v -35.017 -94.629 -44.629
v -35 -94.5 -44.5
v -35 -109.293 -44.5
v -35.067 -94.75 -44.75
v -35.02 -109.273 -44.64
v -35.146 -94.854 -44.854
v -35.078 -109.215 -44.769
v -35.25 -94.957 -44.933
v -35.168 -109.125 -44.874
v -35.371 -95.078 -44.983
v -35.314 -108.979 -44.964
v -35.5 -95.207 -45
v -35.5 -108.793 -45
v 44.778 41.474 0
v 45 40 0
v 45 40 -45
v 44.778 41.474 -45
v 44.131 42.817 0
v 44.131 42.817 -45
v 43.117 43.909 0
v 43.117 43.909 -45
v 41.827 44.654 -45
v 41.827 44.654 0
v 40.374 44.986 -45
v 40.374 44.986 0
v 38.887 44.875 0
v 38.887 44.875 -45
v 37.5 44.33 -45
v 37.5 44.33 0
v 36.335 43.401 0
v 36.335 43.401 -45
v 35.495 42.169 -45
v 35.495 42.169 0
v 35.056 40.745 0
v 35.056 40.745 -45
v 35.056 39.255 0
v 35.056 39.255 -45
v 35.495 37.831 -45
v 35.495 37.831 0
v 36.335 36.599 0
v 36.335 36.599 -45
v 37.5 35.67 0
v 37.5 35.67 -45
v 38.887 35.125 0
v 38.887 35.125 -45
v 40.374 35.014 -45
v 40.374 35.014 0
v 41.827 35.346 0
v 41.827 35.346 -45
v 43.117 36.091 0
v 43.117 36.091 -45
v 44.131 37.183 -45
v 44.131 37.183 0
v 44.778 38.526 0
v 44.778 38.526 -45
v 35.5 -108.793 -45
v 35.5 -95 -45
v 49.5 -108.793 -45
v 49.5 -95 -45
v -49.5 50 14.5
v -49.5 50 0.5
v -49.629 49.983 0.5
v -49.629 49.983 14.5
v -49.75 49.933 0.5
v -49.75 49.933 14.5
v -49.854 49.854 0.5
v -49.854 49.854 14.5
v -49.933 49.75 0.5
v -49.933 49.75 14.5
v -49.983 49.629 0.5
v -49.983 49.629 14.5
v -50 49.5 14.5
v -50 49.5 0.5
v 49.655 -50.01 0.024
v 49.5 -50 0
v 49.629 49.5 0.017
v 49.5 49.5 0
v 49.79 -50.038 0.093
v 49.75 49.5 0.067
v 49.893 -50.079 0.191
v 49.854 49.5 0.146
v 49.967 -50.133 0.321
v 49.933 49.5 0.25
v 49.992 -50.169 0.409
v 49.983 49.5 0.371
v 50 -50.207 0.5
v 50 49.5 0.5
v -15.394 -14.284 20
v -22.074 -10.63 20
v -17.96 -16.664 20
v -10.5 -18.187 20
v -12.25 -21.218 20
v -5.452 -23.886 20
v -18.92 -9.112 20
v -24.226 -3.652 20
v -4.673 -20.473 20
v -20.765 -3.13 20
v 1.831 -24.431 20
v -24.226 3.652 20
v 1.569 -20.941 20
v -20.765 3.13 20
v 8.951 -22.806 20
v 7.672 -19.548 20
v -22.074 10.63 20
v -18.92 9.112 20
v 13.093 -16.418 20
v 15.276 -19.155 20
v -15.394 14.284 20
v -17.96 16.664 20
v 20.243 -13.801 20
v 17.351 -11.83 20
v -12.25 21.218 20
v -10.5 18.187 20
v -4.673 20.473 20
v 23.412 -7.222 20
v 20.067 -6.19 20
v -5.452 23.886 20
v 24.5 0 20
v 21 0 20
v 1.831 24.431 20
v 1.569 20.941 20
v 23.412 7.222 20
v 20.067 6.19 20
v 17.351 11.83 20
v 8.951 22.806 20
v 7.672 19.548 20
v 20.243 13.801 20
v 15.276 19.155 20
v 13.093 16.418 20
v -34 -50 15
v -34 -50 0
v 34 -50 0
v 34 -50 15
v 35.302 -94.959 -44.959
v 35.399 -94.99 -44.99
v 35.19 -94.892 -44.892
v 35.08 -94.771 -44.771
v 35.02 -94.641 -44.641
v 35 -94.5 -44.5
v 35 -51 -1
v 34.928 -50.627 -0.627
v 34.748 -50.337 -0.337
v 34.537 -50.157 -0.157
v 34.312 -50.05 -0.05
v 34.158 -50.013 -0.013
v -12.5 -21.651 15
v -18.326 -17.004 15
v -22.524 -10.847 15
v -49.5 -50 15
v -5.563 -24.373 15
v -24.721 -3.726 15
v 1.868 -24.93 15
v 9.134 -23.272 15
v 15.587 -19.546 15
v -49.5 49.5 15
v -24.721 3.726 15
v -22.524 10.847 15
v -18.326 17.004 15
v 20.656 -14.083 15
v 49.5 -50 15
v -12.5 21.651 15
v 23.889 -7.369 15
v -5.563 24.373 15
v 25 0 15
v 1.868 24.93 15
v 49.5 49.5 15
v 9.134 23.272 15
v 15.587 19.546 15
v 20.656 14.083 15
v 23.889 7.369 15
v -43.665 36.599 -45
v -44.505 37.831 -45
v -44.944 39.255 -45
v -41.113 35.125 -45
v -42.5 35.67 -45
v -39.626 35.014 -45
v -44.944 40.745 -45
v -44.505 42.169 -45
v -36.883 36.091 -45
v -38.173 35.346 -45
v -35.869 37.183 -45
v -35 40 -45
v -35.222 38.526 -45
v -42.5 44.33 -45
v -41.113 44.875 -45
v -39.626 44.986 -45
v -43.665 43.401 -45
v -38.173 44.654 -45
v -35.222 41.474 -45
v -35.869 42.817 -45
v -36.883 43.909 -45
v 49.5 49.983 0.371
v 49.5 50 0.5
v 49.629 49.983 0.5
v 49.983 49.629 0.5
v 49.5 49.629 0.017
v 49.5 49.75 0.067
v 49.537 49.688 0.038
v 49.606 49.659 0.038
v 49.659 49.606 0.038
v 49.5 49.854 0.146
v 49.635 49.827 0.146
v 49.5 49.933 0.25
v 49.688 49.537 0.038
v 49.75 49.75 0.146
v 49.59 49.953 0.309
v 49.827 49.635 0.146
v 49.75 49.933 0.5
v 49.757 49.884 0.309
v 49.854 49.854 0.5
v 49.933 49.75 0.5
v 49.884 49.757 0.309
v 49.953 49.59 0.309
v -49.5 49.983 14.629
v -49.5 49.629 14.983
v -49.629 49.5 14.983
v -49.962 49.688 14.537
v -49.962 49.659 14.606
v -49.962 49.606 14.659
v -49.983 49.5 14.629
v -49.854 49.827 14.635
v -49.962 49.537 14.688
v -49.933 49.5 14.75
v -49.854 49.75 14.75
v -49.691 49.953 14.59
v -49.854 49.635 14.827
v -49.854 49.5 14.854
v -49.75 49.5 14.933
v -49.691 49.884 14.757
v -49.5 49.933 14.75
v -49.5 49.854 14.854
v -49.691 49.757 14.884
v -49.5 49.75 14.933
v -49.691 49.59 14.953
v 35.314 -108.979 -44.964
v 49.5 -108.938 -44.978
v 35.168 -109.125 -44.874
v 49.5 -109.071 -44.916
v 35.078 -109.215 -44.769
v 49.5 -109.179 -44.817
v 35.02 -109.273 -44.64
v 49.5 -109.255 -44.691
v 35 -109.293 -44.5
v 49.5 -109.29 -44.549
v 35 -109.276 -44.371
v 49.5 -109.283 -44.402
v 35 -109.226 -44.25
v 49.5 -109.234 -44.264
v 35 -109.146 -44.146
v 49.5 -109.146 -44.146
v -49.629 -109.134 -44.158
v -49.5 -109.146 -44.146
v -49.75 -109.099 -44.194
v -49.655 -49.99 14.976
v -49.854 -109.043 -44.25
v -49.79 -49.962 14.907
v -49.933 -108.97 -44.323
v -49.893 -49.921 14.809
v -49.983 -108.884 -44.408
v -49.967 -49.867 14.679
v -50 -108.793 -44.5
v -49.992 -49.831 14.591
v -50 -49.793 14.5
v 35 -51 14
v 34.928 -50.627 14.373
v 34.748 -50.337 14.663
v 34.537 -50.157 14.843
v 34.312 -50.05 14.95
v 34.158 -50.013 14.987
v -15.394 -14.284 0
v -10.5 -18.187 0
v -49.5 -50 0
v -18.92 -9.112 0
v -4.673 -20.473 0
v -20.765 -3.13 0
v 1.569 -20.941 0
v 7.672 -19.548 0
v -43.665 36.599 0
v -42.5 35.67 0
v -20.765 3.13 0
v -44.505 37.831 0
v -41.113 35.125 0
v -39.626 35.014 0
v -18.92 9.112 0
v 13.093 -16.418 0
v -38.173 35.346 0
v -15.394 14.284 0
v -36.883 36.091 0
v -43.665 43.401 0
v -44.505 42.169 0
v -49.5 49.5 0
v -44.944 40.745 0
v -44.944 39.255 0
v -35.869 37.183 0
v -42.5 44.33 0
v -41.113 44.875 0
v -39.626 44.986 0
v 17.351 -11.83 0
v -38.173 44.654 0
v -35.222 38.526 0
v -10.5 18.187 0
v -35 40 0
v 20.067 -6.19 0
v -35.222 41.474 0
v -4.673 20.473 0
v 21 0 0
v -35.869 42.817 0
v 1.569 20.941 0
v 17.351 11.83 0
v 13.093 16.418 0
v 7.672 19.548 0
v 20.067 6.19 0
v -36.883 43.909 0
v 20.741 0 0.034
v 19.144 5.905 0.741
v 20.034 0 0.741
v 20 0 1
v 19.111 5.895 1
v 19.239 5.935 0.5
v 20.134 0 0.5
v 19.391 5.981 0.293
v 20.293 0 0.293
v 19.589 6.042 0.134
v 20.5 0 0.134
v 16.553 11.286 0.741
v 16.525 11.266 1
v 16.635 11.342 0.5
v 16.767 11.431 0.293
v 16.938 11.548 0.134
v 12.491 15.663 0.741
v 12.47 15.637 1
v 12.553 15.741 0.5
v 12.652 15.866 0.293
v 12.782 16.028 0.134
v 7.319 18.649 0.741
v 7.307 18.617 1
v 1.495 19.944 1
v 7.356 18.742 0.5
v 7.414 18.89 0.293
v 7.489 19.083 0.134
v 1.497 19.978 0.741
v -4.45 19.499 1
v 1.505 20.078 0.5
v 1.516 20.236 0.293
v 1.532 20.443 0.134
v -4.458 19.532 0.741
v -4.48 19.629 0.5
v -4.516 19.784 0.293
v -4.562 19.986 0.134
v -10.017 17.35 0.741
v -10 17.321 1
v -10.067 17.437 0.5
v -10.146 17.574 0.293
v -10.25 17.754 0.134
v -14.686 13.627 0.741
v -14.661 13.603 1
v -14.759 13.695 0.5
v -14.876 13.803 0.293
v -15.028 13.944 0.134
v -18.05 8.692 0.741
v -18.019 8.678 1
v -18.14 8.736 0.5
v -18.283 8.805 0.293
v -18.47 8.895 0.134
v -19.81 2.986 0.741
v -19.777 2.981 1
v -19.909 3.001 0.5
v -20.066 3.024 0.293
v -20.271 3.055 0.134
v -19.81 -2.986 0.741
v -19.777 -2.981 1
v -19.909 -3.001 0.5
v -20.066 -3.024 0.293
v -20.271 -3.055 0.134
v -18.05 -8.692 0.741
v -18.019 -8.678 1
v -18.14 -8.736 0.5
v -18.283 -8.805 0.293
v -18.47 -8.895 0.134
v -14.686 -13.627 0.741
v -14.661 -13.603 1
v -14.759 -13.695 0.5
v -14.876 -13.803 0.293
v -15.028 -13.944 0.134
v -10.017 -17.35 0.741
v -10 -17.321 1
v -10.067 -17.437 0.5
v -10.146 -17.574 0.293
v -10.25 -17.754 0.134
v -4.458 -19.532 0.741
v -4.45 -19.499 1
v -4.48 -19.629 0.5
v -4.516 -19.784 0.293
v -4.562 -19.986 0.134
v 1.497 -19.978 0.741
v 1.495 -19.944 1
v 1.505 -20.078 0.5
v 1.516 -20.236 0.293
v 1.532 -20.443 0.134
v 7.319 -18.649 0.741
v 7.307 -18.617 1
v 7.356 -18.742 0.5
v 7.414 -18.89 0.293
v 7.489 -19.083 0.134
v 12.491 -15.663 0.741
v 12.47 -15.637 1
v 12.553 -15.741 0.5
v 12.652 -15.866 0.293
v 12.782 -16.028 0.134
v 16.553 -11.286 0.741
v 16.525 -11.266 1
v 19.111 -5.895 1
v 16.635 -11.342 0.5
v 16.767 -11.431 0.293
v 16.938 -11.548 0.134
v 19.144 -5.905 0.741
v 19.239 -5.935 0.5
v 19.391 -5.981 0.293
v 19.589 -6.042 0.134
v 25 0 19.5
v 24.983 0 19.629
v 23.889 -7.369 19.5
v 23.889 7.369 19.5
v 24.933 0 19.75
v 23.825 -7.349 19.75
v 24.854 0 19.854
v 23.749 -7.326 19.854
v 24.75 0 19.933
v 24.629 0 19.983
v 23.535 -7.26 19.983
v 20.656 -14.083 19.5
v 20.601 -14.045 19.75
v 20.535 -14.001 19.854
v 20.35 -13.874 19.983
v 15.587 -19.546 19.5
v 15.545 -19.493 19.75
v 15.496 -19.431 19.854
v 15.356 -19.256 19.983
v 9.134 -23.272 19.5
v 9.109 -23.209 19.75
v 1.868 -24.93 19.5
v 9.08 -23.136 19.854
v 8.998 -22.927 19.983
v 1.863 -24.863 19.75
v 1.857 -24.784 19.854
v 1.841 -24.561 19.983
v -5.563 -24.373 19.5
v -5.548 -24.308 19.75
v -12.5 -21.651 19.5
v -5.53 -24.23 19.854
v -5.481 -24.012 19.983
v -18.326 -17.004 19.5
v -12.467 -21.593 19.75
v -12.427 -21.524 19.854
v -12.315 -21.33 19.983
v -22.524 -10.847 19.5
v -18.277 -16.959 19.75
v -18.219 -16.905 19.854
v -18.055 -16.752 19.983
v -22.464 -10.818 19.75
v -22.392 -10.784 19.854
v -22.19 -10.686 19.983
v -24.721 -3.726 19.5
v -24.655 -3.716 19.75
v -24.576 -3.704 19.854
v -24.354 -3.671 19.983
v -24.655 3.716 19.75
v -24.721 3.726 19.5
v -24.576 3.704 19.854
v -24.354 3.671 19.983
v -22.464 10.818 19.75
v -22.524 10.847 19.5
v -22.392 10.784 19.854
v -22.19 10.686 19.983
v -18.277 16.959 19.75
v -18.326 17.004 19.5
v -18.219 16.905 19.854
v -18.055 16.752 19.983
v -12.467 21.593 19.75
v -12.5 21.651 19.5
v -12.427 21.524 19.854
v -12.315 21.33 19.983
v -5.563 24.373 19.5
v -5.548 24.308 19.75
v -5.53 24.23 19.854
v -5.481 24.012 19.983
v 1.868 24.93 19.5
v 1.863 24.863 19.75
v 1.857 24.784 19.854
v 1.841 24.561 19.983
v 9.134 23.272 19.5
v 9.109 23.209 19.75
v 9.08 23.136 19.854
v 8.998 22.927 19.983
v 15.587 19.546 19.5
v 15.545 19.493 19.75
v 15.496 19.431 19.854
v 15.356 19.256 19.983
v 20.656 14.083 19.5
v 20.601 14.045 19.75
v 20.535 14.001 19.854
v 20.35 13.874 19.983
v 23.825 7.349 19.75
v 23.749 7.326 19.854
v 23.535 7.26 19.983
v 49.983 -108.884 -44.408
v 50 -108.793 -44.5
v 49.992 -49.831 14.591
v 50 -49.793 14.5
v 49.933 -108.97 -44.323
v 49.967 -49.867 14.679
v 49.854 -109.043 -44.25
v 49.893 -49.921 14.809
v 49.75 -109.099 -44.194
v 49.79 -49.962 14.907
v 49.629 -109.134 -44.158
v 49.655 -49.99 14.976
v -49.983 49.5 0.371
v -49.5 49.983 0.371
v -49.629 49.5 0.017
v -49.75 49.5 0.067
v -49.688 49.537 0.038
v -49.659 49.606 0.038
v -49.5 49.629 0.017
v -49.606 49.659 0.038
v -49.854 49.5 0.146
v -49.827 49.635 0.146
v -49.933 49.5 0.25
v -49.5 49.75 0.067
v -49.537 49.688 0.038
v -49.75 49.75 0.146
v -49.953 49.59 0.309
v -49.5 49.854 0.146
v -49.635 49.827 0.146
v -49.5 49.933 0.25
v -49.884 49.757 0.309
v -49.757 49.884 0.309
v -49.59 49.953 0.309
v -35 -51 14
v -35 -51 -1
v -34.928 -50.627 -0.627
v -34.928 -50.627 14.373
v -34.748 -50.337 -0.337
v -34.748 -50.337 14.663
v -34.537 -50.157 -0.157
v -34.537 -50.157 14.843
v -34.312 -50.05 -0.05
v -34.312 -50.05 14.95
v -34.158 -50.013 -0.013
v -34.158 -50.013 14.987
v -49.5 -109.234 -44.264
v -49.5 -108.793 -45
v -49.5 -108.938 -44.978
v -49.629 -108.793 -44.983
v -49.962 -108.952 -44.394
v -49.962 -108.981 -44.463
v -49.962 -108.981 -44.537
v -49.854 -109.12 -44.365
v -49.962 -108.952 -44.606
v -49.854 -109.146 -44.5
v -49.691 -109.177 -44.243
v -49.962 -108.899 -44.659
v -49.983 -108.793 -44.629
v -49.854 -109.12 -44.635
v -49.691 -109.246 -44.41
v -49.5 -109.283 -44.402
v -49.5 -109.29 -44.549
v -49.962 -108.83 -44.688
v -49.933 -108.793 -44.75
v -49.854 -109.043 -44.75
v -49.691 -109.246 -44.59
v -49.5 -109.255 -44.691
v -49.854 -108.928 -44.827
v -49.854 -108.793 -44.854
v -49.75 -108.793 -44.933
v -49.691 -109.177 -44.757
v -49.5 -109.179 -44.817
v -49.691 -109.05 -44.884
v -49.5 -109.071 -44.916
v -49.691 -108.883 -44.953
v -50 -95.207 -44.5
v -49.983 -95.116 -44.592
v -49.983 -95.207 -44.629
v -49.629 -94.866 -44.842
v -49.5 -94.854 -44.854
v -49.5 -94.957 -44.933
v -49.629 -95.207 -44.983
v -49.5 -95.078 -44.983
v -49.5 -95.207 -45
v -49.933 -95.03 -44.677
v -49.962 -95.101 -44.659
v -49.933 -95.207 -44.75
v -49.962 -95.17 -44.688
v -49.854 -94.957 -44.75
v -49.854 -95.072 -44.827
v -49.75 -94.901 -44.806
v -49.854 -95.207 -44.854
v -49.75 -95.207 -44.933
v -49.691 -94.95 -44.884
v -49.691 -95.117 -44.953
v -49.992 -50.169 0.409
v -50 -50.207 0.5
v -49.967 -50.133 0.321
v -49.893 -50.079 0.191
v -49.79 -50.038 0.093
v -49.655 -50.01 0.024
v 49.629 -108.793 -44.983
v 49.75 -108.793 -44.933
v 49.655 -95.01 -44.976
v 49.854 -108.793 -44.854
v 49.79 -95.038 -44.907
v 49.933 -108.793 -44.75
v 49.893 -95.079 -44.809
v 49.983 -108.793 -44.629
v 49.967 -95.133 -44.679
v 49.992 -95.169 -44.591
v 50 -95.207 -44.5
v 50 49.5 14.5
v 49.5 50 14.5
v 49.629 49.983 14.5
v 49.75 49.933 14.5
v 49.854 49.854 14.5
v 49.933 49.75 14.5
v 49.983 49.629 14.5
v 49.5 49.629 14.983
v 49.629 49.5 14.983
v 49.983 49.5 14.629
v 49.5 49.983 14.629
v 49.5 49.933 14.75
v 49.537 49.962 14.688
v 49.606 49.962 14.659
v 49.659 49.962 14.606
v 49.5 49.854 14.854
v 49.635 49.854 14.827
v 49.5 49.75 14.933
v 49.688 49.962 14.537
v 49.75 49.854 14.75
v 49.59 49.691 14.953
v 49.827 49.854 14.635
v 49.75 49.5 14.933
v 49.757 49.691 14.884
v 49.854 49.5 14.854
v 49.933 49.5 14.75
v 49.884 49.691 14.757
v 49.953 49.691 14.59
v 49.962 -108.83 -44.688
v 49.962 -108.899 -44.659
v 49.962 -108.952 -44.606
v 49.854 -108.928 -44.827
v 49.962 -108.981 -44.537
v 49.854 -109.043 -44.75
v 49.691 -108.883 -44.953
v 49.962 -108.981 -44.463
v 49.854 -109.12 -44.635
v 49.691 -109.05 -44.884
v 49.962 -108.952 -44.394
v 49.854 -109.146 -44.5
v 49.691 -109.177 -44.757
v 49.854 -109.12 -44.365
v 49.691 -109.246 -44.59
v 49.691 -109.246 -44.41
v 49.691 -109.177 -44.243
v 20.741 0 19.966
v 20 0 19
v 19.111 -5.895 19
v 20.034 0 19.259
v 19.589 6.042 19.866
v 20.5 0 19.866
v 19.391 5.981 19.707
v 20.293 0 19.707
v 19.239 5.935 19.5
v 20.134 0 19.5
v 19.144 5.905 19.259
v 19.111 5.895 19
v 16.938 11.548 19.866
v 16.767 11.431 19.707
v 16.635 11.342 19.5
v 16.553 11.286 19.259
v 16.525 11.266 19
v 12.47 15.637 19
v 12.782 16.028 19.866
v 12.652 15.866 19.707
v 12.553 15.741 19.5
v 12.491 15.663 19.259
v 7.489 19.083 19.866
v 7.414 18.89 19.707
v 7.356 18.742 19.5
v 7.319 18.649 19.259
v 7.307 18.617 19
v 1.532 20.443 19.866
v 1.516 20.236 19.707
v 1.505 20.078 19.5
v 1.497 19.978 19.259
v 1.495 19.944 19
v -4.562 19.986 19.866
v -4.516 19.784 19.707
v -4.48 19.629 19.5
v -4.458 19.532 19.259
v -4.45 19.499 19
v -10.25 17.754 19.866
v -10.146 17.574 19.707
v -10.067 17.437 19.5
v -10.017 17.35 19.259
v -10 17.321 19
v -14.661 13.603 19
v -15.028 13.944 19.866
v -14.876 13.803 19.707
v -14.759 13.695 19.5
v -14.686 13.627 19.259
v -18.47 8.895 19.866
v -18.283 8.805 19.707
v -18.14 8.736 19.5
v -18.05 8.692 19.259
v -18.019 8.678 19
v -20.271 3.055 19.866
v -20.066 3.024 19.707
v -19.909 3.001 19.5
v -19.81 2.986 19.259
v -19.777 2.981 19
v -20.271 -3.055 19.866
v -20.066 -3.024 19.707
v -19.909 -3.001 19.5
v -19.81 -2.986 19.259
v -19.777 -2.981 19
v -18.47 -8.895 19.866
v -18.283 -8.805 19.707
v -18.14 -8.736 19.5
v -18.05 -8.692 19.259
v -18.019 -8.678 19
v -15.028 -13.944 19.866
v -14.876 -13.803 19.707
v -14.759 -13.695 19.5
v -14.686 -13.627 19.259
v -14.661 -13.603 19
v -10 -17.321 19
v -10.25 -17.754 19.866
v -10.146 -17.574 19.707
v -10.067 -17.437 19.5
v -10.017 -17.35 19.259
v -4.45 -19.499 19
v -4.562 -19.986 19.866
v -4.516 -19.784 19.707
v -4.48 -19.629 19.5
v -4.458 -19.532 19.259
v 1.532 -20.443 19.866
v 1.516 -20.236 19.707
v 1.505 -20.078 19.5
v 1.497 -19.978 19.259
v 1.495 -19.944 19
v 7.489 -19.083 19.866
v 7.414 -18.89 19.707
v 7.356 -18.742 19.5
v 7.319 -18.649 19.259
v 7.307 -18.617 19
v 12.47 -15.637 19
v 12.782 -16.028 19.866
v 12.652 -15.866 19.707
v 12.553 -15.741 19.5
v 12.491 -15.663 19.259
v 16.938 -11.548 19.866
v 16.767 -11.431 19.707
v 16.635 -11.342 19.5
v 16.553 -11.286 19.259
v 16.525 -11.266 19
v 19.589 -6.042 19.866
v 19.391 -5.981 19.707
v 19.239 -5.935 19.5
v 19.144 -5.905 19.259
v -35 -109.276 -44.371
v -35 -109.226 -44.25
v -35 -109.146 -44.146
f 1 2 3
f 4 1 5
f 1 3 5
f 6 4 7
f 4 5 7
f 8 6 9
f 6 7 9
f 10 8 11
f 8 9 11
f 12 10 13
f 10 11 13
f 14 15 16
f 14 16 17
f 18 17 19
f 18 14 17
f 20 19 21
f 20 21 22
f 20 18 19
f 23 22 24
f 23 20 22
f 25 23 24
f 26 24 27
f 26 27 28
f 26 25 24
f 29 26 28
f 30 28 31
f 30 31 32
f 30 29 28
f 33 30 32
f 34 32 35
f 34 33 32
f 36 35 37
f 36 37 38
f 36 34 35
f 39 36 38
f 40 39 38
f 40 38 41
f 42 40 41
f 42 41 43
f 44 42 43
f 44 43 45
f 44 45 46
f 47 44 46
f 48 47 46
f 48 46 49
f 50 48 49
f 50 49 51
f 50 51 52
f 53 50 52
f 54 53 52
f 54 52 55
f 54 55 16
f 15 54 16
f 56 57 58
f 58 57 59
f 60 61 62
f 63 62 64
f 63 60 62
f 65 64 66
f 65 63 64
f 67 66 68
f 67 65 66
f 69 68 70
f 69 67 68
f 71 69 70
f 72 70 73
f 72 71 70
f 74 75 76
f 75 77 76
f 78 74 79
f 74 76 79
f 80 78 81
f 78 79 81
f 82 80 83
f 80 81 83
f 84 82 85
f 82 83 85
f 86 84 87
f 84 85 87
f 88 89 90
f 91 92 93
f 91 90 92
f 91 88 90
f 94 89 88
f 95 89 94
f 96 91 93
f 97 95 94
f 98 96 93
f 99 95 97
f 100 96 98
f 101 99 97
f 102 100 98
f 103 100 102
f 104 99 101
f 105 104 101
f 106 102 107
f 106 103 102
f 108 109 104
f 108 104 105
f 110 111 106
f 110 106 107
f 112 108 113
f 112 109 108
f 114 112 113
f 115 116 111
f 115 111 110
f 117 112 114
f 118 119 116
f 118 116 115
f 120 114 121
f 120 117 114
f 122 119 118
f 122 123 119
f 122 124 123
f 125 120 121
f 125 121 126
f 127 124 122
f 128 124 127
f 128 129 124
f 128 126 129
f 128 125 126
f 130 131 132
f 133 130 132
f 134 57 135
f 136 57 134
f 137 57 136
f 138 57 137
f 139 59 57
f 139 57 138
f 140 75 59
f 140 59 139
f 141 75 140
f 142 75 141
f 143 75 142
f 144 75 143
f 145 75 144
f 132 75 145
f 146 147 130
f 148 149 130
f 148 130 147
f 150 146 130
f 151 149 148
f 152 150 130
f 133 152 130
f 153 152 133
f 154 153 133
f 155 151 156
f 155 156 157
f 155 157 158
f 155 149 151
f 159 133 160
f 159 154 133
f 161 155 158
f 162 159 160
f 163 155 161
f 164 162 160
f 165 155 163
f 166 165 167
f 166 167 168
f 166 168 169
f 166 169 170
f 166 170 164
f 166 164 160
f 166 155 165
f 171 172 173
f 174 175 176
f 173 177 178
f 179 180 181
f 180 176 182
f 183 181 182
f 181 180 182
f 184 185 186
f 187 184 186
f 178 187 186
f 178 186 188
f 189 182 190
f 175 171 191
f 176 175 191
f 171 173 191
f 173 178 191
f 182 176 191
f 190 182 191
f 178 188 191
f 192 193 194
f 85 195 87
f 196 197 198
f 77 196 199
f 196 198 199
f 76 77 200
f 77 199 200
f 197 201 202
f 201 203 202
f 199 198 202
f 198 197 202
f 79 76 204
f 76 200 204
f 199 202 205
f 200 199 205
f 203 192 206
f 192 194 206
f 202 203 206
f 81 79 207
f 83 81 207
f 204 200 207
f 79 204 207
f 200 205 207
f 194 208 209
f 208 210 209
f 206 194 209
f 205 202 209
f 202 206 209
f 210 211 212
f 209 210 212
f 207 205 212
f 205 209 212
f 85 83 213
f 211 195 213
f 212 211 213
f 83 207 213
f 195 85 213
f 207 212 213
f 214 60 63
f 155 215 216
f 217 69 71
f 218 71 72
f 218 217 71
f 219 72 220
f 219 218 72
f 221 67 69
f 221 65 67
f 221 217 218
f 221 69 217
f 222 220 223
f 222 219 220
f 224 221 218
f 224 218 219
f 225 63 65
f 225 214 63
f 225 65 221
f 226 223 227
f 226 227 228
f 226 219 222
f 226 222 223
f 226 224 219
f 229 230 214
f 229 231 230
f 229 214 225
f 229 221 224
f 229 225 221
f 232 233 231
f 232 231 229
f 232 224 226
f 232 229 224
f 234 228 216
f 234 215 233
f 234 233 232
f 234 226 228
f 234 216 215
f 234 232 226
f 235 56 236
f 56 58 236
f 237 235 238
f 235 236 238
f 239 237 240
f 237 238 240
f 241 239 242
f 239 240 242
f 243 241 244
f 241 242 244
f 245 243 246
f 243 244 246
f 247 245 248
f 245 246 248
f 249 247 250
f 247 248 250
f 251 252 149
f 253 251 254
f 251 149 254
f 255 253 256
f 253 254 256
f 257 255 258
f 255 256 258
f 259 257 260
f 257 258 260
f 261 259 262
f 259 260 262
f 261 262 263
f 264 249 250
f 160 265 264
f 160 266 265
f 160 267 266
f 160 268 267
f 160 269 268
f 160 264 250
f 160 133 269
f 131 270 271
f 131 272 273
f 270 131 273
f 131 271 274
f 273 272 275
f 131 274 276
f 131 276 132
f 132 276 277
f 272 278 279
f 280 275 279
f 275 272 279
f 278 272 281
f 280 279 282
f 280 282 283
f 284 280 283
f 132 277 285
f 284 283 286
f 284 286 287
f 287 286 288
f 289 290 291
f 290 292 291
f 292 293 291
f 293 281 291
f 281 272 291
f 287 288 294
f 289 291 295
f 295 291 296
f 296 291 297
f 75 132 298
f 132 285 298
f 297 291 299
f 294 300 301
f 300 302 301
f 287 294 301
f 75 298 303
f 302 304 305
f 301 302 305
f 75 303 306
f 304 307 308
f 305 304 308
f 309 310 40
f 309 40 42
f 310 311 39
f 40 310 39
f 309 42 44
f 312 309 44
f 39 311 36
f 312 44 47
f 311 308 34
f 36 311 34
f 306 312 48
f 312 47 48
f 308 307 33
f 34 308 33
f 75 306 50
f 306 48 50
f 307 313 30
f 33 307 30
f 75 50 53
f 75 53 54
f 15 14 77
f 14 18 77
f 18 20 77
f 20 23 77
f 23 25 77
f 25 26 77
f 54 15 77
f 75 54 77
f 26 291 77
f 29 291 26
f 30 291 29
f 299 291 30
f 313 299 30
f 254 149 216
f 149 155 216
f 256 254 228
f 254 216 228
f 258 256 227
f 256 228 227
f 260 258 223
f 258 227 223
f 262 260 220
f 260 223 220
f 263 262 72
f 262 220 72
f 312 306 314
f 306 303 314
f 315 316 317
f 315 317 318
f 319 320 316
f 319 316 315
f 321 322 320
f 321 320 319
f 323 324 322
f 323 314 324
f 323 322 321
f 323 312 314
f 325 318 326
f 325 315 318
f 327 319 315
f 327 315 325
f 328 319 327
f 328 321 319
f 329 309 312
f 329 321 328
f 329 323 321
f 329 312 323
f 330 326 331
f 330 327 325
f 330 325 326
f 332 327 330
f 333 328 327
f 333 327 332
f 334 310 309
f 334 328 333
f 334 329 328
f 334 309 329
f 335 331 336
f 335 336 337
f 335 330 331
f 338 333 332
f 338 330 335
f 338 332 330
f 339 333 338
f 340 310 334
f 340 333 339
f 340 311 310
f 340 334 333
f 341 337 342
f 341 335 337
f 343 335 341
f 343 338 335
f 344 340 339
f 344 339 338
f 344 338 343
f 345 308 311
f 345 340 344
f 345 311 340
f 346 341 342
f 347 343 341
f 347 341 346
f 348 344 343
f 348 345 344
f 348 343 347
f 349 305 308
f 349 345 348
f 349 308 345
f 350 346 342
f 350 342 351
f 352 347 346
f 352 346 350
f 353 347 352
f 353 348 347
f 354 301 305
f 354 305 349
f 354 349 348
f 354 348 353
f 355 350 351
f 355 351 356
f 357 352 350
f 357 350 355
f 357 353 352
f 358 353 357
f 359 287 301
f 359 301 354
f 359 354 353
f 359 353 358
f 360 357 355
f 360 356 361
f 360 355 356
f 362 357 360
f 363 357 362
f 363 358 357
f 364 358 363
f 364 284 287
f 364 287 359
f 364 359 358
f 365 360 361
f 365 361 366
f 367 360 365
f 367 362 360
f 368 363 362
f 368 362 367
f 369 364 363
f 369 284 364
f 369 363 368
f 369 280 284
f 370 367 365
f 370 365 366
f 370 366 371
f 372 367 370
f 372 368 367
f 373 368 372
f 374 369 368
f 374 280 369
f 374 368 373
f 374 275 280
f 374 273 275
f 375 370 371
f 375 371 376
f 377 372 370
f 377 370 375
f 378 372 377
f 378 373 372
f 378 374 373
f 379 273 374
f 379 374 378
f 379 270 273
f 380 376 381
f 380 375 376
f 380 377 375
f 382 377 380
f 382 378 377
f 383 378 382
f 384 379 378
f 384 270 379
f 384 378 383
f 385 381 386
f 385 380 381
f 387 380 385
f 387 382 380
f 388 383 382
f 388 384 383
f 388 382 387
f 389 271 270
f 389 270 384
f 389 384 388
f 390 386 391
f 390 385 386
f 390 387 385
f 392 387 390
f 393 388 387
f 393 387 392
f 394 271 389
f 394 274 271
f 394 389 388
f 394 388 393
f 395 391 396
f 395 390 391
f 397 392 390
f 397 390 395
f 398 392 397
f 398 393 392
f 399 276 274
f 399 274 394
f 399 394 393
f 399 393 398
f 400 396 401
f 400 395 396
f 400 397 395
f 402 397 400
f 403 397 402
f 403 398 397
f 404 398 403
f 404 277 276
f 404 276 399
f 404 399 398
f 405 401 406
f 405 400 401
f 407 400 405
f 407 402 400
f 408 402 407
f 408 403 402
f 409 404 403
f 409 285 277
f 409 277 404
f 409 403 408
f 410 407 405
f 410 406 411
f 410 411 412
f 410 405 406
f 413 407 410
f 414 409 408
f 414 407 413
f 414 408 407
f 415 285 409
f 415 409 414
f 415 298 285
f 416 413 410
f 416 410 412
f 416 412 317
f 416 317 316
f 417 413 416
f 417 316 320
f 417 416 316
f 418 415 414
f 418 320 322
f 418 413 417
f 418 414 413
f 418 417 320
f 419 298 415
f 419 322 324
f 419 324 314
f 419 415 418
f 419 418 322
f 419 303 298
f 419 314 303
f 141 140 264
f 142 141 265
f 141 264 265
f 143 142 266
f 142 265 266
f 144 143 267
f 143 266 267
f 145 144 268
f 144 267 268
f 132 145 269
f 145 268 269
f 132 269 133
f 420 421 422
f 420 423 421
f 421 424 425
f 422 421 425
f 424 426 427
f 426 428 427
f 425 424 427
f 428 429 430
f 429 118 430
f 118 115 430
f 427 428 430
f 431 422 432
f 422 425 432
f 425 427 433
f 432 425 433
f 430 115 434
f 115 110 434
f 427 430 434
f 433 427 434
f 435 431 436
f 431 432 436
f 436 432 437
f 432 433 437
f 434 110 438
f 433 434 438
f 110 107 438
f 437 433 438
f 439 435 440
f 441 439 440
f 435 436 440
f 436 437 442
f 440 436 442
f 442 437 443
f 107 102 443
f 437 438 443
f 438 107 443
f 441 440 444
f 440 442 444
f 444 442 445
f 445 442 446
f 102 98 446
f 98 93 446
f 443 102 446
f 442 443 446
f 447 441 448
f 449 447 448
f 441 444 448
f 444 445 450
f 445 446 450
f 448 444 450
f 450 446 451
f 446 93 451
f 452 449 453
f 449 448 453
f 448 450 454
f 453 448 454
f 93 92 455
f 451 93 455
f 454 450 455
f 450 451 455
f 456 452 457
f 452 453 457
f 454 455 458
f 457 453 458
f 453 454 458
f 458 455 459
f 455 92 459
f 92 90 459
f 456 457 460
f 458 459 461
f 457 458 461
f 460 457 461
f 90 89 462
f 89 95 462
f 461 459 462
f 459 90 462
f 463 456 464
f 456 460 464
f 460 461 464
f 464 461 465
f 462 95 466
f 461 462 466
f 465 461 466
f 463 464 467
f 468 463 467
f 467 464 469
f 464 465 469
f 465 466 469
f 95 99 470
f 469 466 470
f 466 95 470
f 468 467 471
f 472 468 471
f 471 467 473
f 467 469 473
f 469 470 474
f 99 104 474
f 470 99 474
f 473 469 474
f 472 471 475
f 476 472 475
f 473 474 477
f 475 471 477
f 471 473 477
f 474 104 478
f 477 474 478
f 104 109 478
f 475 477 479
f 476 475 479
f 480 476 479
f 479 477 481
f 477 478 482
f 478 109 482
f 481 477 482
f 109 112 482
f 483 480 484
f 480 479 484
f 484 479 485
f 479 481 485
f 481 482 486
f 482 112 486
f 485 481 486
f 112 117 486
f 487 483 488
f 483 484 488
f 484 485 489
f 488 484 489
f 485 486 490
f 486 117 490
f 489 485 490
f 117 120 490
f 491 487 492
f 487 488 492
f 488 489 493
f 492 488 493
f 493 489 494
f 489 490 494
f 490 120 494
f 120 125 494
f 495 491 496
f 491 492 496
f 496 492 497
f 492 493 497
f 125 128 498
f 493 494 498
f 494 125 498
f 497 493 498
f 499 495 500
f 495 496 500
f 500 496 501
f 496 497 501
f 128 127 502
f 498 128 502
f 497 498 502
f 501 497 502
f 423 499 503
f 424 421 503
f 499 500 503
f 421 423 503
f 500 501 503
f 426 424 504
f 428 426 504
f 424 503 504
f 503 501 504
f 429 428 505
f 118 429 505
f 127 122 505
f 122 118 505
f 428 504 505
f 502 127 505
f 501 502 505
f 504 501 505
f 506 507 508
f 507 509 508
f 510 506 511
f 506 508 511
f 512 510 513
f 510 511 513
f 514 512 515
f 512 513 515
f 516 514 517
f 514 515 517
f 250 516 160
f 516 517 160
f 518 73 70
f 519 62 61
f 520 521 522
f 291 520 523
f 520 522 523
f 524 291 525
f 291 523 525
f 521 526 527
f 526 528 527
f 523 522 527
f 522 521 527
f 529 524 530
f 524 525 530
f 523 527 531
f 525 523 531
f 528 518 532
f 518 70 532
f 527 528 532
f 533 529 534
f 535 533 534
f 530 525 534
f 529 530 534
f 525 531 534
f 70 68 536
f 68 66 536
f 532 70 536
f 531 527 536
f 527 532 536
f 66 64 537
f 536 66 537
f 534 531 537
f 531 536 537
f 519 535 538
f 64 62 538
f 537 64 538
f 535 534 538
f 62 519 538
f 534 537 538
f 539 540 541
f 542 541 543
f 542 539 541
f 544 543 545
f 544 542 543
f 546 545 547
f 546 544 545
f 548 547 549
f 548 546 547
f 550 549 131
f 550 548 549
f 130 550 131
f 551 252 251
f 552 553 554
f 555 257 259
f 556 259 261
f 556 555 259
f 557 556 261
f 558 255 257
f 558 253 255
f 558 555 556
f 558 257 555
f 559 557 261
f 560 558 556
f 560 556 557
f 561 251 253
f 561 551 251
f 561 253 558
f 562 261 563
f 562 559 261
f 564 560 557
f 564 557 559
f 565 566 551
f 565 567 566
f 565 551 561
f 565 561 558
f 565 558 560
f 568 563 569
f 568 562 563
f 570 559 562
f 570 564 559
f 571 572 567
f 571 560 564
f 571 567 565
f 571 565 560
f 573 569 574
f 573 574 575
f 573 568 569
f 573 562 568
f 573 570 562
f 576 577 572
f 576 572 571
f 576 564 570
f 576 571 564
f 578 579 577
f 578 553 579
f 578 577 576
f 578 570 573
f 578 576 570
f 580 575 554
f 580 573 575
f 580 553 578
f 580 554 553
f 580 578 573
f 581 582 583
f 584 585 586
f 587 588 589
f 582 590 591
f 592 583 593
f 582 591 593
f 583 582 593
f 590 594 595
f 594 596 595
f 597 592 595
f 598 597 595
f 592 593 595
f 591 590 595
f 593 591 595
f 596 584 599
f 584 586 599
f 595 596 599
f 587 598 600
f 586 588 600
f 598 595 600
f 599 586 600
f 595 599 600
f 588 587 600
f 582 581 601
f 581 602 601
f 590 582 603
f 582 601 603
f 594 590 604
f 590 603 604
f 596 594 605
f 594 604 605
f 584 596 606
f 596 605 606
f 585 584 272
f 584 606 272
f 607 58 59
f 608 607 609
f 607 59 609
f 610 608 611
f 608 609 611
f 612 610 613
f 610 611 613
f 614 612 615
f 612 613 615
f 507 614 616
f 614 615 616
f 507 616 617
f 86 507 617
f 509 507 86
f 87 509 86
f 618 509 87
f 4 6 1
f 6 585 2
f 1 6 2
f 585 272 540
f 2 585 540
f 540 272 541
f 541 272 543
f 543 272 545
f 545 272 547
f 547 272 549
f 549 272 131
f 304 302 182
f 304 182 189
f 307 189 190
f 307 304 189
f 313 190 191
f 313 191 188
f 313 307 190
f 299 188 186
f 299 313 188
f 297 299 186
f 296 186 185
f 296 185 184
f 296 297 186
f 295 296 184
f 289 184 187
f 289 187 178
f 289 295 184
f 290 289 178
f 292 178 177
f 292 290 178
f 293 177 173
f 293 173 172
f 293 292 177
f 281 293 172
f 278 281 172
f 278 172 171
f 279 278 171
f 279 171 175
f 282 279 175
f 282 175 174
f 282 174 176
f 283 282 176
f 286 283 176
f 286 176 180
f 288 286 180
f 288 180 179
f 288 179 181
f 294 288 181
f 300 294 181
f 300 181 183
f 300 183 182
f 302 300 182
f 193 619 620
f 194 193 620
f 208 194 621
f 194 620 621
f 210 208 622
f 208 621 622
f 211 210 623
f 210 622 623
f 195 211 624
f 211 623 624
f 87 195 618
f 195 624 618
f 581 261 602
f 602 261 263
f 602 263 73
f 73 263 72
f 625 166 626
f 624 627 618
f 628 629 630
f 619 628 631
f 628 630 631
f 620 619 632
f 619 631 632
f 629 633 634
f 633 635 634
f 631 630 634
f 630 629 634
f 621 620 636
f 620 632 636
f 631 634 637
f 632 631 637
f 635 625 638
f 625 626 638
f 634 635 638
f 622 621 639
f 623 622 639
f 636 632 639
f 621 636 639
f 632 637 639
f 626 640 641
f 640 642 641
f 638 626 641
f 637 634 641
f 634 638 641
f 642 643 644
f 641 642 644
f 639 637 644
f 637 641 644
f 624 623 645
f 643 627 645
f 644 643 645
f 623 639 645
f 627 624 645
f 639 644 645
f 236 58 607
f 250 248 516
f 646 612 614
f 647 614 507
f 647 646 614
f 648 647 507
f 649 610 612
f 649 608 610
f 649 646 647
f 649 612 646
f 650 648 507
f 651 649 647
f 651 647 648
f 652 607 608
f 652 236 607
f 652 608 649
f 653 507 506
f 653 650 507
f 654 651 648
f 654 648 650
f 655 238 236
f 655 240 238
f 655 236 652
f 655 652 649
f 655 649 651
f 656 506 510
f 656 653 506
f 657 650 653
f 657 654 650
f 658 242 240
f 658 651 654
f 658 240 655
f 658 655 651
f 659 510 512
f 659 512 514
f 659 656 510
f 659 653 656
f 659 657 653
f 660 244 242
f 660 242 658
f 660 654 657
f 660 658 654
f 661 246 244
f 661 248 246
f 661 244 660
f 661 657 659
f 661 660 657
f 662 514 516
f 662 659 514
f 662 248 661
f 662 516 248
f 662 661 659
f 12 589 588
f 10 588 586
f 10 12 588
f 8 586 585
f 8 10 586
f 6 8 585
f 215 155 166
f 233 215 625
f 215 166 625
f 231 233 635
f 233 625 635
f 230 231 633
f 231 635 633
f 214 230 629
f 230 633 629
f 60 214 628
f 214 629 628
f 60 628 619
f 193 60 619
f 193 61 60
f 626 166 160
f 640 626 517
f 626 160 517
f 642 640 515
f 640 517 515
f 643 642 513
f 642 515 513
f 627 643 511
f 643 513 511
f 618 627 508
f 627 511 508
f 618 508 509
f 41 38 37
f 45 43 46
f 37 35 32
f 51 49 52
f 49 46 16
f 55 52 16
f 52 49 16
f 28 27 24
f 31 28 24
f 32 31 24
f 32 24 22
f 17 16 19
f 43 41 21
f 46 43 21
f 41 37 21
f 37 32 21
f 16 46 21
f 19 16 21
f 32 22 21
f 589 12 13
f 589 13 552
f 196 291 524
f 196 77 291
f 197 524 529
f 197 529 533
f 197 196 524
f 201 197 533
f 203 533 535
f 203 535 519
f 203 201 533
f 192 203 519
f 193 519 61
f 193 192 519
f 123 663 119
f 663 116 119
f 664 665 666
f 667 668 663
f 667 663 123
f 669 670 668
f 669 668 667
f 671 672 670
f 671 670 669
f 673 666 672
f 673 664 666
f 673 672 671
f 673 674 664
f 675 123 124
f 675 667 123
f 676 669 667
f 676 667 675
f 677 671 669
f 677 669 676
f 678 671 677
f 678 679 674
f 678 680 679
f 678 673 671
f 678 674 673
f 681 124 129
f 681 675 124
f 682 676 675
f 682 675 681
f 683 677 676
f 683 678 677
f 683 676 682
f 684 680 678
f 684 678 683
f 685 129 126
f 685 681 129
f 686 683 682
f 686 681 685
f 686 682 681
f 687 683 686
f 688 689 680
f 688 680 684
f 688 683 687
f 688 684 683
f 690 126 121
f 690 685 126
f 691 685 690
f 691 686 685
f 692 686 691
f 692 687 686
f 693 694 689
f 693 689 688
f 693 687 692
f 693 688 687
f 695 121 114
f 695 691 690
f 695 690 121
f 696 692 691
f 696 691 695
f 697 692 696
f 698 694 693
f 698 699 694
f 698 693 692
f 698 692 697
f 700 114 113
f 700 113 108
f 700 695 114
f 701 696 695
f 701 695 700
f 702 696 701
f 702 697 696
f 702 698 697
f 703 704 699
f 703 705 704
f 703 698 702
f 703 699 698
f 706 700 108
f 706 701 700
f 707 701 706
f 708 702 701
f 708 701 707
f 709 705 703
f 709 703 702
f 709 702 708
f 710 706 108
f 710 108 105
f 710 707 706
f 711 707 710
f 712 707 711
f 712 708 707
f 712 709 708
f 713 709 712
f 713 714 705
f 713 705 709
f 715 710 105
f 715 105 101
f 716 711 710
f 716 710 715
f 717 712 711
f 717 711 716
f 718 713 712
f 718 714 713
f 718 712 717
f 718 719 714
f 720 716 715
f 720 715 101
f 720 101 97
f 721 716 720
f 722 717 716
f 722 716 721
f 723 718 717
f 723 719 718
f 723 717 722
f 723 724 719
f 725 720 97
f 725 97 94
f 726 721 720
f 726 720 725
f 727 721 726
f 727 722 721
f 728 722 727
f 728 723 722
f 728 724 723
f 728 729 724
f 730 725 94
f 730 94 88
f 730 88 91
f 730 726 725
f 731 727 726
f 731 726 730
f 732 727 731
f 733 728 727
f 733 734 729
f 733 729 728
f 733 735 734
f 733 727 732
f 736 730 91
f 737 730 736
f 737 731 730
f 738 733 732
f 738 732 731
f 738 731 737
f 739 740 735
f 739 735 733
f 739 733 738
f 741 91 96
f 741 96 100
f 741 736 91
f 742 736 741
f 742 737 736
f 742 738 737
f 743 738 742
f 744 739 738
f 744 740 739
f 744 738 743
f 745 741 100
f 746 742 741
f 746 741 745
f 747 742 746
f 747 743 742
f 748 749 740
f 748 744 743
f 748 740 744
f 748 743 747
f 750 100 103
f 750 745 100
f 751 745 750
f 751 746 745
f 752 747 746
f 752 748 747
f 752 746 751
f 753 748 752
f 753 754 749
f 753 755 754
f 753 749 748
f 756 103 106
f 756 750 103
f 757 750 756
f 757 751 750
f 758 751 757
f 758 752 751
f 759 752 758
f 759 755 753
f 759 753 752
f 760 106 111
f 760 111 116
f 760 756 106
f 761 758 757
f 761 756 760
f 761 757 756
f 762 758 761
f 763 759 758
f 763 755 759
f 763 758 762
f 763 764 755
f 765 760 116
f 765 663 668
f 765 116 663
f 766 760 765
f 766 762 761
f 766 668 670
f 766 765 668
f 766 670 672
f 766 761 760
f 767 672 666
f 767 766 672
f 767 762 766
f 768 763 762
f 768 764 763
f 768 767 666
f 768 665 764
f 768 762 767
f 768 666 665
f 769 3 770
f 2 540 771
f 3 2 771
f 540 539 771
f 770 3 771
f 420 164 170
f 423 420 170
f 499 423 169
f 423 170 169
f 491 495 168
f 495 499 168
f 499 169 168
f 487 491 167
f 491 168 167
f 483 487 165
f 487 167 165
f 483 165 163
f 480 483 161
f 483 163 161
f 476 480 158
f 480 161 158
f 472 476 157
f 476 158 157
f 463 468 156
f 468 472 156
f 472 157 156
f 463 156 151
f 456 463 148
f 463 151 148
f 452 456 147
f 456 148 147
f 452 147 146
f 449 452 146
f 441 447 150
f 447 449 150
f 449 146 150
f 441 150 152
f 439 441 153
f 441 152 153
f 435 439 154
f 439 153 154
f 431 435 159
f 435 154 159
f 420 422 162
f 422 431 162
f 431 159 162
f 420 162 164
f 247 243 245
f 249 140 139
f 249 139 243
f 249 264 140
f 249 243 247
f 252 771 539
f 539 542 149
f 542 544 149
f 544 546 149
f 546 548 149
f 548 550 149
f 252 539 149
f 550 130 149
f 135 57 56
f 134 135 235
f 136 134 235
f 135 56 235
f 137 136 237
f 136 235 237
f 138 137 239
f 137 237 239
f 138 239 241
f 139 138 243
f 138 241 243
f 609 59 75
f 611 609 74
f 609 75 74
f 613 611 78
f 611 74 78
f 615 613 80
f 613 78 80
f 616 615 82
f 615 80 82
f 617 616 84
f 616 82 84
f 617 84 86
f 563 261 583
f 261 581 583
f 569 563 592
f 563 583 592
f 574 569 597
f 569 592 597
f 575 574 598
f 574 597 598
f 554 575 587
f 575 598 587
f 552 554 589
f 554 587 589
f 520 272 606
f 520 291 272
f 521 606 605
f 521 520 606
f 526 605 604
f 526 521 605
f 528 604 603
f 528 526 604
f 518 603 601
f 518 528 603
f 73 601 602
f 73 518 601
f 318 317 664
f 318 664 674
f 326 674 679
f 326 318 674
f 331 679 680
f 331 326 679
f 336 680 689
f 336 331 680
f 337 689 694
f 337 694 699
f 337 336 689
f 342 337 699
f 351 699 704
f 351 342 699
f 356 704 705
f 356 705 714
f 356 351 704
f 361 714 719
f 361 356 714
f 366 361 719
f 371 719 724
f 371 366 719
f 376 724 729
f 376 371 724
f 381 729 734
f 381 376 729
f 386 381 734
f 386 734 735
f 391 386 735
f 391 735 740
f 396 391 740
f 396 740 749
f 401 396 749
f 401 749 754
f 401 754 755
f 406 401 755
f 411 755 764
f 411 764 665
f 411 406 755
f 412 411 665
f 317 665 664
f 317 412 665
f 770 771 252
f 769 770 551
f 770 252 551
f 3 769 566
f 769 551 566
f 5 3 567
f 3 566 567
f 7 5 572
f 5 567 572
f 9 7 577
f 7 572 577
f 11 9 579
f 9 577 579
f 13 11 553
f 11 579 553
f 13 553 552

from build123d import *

# Parameters (mm, degrees)
F0_W     = 100
F0_H     = 100
F0_R     = 5
F0_R_2   = 25
F1_DEPTH = 15
F0_R_3   = 19.999999553
F2_DEPTH = 20
F3_DEPTH = 45
F5_W     = 15
F5_H     = 15
F10_R    = 1
F11_R    = 0.5


with BuildPart() as f1:
    # F0 (on Top) → F1 (new body)
    with BuildSketch(Plane.XY):
        Rectangle(F0_W, F0_H)
        with Locations((-40, 40)):
            Circle(F0_R, mode=Mode.SUBTRACT)
        Circle(F0_R_2, mode=Mode.SUBTRACT)
        with Locations((40, 40)):
            Circle(F0_R, mode=Mode.SUBTRACT)
        with Locations((40, 40)):
            Circle(F0_R)
        with Locations((-40, 40)):
            Circle(F0_R)
    extrude(amount=F1_DEPTH)

    # F0 (on Top) → F2 (join)
    with BuildSketch(Plane.XY):
        Circle(F0_R_2)
        Circle(F0_R_3, mode=Mode.SUBTRACT)
    extrude(amount=F2_DEPTH)

    # F0 (on Top) → F3 (join)
    with BuildSketch(Plane.XY):
        with Locations((-40, 40)):
            Circle(F0_R)
        with Locations((40, 40)):
            Circle(F0_R)
    extrude(amount=-F3_DEPTH)

    # F8: sweep along a path in F7
    with BuildLine(Plane.YZ.offset(50)) as f8_path:
        Line((-110, -45), (-50, 15))
    # F5 (on offset) → F8 (sweep)
    with BuildSketch(Plane.XY.offset(-45)):
        with Locations((42.5, -102.5)):
            Rectangle(F5_W, F5_H)
    sweep(path=f8_path.line)

    # F9: F1 across plane


with BuildPart() as f1_1:
    add(f1.part)
    add(f1.part.mirror(Plane.YZ))

    # F10
    f10_edges = [f1_1.edges().sort_by_distance(p)[0] for p in [
        (-35, -50, 7.5),
        (35, -50, 7.5),
        (-20, 0, 0),
        (20, 0, 10),
        (-20, 0, 20),
    ]]
    fillet(f10_edges, radius=F10_R)

    # F11
    f11_edges = [f1_1.edges().sort_by_distance(p)[0] for p in [
        (-25, 0, 20),
        (50, 0, 15),
        (0, 50, 15),
        (50, 50, 7.5),
        (-50, 50, 7.5),
        (-50, 0, 15),
        (-50, 0, 0),
        (0, 50, 0),
        (50, 0, 0),
        (50, -72.5, -22.5),
        (50, -80, -15),
        (-50, -80, -15),
        (-50, -72.5, -22.5),
        (-50, -102.5, -45),
        (-42.5, -95, -45),
        (-42.5, -110, -45),
        (35, -102.5, -45),
        (42.5, -110, -45),
        (-35, -102.5, -45),
        (50, -102.5, -45),
    ]]
    fillet(f11_edges, radius=F11_R)


solid = f1_1.part
